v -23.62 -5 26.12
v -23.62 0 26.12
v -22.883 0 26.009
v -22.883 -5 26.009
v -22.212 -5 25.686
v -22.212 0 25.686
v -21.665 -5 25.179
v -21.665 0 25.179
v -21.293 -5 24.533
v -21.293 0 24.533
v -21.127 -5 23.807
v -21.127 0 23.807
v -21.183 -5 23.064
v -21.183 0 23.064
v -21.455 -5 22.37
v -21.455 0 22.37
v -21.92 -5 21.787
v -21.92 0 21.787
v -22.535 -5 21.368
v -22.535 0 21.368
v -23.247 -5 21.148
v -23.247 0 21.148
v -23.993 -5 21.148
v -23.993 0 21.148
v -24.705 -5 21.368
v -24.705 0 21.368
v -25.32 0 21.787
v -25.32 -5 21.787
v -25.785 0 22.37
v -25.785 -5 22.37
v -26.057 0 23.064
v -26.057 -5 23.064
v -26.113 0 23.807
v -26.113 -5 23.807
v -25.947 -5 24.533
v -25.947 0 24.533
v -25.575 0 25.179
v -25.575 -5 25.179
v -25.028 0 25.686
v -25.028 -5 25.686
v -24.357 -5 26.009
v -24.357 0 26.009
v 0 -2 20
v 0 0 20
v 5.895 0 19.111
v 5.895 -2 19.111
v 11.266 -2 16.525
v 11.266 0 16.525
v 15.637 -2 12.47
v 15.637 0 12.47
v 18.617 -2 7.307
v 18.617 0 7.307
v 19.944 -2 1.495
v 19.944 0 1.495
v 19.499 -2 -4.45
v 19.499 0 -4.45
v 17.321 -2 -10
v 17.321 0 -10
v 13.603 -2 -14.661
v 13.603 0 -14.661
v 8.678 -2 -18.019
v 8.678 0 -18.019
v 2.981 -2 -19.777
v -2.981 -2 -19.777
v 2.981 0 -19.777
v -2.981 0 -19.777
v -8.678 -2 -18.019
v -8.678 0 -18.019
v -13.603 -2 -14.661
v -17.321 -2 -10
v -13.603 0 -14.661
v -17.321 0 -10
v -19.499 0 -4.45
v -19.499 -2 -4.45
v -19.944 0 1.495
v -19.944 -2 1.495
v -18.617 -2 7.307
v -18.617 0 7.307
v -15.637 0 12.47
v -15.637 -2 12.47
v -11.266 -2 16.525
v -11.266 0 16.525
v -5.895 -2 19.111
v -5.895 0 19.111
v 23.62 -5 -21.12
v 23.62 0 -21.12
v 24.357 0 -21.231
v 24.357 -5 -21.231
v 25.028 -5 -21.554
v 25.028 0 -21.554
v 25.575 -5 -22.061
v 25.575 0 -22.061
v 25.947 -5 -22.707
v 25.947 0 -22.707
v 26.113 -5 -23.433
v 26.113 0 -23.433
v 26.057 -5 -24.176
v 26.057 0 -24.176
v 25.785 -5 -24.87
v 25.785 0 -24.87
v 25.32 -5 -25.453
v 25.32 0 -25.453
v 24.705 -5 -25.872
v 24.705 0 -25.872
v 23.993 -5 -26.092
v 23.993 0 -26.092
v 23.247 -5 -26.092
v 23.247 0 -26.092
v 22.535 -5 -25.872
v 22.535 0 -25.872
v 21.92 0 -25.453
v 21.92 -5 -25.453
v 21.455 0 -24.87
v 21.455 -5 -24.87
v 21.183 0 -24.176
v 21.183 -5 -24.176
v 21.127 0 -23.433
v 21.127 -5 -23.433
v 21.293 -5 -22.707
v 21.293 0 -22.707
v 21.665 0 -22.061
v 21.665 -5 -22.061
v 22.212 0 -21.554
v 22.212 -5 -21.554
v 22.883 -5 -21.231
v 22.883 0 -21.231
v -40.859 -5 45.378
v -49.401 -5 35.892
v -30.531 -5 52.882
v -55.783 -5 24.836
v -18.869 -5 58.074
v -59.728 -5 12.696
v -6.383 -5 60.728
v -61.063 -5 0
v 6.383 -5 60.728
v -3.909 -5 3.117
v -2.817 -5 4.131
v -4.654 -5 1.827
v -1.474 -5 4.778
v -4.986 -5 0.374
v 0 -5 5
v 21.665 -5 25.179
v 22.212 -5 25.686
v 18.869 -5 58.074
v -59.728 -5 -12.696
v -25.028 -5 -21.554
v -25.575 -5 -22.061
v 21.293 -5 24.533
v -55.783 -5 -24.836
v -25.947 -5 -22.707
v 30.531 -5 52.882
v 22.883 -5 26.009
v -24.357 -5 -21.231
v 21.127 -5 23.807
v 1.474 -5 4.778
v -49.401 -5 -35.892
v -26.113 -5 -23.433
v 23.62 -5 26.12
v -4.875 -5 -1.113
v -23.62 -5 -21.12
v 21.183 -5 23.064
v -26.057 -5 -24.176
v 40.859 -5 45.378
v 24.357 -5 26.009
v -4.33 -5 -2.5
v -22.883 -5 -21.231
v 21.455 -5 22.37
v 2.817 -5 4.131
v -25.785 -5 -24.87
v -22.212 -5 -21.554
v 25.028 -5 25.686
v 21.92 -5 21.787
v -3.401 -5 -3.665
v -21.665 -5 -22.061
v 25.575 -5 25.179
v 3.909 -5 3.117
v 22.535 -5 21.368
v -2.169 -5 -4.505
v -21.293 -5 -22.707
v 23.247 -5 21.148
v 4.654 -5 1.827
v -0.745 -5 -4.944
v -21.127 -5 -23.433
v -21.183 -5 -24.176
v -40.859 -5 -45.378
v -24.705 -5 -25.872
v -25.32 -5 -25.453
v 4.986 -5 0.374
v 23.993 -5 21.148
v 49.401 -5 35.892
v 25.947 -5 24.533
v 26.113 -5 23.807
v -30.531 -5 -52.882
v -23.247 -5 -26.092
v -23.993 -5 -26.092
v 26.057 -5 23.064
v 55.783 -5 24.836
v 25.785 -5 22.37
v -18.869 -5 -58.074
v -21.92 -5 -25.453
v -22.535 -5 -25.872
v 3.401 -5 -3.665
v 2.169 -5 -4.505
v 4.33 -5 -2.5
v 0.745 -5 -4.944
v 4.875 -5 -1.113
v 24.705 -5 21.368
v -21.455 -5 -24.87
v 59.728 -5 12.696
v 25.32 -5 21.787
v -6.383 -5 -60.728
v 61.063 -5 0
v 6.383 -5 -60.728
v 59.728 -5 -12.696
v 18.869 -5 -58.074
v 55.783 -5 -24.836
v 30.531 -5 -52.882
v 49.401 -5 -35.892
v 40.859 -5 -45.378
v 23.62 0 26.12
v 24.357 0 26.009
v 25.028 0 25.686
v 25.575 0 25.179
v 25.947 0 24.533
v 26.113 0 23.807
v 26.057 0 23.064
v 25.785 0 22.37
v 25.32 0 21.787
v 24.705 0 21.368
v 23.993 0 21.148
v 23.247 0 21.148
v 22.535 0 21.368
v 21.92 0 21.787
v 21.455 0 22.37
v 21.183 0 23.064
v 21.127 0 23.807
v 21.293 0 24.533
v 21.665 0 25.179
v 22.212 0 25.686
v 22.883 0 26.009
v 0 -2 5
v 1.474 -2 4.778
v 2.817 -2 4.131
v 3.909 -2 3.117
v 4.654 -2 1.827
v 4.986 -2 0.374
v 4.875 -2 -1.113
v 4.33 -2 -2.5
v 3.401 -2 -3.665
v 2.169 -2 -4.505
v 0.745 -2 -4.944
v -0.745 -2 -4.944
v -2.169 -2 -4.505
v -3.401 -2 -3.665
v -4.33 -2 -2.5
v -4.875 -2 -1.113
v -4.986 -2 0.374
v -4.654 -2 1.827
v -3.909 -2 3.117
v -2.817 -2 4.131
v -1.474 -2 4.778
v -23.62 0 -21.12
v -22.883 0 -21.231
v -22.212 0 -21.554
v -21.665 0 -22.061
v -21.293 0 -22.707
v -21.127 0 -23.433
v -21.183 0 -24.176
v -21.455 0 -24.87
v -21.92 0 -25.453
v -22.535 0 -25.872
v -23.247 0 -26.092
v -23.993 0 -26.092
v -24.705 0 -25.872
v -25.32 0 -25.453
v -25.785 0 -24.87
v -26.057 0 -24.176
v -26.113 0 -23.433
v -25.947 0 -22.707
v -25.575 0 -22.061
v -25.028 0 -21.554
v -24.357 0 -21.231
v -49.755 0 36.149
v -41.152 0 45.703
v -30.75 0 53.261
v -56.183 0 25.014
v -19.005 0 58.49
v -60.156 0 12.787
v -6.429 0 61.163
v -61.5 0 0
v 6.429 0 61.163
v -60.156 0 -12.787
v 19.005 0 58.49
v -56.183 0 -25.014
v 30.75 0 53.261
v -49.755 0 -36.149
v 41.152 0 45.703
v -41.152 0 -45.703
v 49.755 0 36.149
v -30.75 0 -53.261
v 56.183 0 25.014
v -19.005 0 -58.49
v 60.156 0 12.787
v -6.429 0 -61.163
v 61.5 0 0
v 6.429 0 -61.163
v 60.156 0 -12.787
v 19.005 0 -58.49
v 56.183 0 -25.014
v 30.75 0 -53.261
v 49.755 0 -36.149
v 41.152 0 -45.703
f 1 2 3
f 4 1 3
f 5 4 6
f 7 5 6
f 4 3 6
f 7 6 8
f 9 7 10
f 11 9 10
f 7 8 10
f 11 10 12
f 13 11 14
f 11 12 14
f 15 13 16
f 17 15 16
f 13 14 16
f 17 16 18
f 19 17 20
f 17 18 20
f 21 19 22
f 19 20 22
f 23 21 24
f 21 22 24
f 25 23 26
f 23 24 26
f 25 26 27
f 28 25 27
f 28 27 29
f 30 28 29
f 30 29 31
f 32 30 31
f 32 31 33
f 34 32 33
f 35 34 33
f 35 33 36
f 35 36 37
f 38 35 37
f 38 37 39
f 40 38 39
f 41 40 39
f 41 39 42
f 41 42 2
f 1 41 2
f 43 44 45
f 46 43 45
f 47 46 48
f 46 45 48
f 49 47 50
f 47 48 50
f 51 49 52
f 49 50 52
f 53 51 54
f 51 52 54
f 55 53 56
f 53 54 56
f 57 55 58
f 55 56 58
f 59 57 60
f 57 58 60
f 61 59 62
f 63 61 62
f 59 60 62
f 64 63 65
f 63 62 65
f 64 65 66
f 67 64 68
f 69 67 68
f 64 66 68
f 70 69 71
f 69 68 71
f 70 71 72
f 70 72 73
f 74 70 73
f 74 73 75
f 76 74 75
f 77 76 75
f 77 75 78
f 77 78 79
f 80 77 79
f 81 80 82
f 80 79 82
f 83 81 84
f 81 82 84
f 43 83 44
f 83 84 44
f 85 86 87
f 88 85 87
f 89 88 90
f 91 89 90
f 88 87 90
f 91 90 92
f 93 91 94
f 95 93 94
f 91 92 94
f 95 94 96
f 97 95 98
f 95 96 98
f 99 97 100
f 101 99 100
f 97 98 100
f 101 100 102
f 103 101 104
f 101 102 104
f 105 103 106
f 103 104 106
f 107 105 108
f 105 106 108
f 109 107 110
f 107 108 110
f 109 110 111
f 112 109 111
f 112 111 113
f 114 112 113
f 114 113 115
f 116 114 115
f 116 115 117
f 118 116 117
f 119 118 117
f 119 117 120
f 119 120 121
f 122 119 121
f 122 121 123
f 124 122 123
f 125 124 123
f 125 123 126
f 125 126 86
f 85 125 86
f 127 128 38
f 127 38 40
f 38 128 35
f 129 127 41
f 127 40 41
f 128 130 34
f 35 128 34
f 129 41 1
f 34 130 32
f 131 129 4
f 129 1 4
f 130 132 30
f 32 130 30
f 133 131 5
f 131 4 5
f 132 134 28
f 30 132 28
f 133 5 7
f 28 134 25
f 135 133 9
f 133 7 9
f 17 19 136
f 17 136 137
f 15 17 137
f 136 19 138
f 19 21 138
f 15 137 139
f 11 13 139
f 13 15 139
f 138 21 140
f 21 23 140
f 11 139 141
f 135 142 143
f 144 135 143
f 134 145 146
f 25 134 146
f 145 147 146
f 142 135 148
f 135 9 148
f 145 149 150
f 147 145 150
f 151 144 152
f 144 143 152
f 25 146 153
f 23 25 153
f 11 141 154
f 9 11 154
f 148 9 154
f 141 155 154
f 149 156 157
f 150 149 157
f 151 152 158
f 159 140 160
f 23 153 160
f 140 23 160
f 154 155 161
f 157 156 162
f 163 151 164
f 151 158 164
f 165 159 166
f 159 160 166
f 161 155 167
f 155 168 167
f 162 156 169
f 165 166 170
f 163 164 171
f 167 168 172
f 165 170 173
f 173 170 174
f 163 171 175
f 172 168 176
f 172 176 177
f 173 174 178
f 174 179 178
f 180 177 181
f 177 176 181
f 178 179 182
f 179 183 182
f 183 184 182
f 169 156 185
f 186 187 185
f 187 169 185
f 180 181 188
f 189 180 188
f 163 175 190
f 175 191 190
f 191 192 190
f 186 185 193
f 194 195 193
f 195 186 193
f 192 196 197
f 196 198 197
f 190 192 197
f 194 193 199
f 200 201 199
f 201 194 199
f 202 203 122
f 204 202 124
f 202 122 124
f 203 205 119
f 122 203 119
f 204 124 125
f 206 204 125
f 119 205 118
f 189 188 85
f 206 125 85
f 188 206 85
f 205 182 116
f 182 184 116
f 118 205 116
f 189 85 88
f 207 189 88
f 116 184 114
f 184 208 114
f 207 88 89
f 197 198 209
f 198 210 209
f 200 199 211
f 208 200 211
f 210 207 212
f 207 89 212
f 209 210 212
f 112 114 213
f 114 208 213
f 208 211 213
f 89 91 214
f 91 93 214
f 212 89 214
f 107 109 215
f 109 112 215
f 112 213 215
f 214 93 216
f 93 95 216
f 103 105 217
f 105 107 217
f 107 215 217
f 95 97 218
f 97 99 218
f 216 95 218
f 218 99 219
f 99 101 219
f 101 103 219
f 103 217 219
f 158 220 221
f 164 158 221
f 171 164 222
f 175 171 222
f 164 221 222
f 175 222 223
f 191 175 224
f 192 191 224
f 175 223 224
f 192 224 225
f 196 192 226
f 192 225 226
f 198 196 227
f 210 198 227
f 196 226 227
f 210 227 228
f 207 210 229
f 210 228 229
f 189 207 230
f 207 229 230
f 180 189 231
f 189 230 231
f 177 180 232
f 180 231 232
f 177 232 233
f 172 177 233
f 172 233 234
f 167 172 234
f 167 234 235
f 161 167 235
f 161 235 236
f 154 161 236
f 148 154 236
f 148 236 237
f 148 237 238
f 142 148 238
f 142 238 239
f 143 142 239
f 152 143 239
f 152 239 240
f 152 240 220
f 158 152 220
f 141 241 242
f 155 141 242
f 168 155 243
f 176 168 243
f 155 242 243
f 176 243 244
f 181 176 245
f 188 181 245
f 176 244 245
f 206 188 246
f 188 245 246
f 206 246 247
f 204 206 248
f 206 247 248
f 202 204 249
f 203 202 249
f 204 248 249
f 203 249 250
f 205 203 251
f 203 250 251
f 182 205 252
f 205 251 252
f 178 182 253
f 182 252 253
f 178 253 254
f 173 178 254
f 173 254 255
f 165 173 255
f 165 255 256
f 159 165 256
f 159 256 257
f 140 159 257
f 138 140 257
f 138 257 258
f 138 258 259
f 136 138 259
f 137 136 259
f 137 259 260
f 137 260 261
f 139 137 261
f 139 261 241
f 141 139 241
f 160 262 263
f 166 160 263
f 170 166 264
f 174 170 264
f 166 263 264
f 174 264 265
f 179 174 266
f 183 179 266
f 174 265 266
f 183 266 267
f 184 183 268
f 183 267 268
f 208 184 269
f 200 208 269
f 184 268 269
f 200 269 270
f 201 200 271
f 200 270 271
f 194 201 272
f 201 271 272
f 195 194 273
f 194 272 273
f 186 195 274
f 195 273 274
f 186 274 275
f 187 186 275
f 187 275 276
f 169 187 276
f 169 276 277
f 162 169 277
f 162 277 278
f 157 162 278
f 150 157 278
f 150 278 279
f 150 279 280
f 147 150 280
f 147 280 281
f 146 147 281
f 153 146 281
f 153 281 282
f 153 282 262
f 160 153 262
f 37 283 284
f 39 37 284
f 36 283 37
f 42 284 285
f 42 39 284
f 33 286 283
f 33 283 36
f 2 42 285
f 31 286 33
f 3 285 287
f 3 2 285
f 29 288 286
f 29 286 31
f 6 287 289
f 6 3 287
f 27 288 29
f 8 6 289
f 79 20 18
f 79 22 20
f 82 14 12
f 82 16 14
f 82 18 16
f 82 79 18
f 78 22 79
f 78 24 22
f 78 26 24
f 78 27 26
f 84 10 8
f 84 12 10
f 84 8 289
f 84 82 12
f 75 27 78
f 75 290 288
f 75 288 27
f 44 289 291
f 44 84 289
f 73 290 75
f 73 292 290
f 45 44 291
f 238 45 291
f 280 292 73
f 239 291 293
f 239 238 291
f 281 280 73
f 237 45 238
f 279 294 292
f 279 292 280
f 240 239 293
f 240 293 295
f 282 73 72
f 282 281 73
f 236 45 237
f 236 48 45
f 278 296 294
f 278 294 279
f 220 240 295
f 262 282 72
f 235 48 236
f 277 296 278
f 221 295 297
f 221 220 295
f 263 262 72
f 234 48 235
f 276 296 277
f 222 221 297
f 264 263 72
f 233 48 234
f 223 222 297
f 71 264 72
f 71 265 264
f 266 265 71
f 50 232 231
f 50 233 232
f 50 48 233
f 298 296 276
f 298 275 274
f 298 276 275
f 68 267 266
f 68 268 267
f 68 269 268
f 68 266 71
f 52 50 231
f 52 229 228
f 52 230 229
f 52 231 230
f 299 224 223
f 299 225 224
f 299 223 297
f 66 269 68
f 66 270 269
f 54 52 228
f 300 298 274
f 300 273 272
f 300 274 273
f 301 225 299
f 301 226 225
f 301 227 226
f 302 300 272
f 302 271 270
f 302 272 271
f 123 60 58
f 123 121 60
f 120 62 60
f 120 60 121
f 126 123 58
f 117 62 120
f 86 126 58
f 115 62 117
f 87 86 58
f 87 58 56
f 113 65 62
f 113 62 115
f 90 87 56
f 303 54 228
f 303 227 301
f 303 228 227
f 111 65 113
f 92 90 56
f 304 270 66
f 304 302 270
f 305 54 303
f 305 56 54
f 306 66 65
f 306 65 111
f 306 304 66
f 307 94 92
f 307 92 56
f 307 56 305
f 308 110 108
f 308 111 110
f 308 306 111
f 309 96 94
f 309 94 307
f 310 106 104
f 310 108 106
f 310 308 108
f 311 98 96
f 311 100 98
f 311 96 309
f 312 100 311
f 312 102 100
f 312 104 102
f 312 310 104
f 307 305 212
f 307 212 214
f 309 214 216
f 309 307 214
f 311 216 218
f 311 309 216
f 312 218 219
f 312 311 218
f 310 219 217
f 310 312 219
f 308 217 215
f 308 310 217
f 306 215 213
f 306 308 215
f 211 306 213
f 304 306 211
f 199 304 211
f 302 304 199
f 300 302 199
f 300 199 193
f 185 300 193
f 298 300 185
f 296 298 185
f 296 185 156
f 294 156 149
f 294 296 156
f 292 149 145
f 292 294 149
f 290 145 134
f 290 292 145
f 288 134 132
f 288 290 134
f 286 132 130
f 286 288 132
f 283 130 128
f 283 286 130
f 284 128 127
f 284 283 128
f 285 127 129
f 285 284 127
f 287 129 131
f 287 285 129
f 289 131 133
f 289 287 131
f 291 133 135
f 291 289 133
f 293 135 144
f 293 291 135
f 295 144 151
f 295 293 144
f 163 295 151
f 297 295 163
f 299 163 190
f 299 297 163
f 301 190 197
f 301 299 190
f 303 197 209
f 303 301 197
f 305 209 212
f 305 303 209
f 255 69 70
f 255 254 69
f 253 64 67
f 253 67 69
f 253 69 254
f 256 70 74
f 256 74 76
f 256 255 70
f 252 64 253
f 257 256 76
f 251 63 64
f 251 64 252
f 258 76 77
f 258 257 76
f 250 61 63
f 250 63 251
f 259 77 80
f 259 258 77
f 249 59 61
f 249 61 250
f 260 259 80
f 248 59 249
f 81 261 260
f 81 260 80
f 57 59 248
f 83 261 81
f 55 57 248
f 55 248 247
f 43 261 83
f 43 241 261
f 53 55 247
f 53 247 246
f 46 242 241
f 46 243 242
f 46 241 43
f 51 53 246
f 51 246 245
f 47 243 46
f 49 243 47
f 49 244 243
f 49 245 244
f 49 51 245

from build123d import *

# Parameters (mm, degrees)
SKETCH1_R           = 61.5
BOSS_EXTRUDE1_DEPTH = 5
BOSS_EXTRUDE1_DRAFT = -5
SKETCH2_R           = 2.5
SKETCH2_R_2         = 5
CUT_EXTRUDE2_DEPTH  = 88.117736426
SKETCH3_R           = 20
CUT_EXTRUDE3_DEPTH  = 2


with BuildPart() as part:
    # Sketch1 → Boss-Extrude1 (with draft: the straight prism first)
    with BuildSketch(Plane(origin=(0, 0, 0), x_dir=(1, 0, 0), z_dir=(0, 1, 0))):
        Circle(SKETCH1_R)
    extrude(amount=-BOSS_EXTRUDE1_DEPTH)
    # Boss-Extrude1: the draft: its side faces are tilted about the plane it starts from
    boss_extrude1_sides = [part.faces().sort_by_distance(p)[0] for p in [
        (-61.5, -2.5, 0),
    ]]
    draft(boss_extrude1_sides, Plane(origin=(0, 0, 0), x_dir=(1, 0, 0), z_dir=(0, 1, 0)), BOSS_EXTRUDE1_DRAFT)

    # Sketch2 → Cut-Extrude2 (cut, through all)
    with BuildSketch(Plane(origin=(0, 0, 0), x_dir=(1, 0, 0), z_dir=(0, 1, 0))):
        with Locations(Location((23.62, 23.62, 0), (0, 0, 270))):
            Circle(SKETCH2_R)
        with Locations(Location((23.62, -23.62, 0), (0, 0, 270))):
            Circle(SKETCH2_R)
        with Locations(Location((-23.62, -23.62, 0), (0, 0, 270))):
            Circle(SKETCH2_R)
        with Locations(Location((-23.62, 23.62, 0), (0, 0, 270))):
            Circle(SKETCH2_R)
        with Locations(Location((0, 0, 0), (0, 0, 270))):
            Circle(SKETCH2_R_2)
    extrude(amount=-CUT_EXTRUDE2_DEPTH, mode=Mode.SUBTRACT)

    # Sketch3 → Cut-Extrude3 (cut)
    with BuildSketch(Plane(origin=(0, 0, 0), x_dir=(1, 0, 0), z_dir=(0, 1, 0))):
        with Locations(Location((0, 0, 0), (0, 0, 270))):
            Circle(SKETCH3_R)
    extrude(amount=-CUT_EXTRUDE3_DEPTH, mode=Mode.SUBTRACT)


solid = part.part
